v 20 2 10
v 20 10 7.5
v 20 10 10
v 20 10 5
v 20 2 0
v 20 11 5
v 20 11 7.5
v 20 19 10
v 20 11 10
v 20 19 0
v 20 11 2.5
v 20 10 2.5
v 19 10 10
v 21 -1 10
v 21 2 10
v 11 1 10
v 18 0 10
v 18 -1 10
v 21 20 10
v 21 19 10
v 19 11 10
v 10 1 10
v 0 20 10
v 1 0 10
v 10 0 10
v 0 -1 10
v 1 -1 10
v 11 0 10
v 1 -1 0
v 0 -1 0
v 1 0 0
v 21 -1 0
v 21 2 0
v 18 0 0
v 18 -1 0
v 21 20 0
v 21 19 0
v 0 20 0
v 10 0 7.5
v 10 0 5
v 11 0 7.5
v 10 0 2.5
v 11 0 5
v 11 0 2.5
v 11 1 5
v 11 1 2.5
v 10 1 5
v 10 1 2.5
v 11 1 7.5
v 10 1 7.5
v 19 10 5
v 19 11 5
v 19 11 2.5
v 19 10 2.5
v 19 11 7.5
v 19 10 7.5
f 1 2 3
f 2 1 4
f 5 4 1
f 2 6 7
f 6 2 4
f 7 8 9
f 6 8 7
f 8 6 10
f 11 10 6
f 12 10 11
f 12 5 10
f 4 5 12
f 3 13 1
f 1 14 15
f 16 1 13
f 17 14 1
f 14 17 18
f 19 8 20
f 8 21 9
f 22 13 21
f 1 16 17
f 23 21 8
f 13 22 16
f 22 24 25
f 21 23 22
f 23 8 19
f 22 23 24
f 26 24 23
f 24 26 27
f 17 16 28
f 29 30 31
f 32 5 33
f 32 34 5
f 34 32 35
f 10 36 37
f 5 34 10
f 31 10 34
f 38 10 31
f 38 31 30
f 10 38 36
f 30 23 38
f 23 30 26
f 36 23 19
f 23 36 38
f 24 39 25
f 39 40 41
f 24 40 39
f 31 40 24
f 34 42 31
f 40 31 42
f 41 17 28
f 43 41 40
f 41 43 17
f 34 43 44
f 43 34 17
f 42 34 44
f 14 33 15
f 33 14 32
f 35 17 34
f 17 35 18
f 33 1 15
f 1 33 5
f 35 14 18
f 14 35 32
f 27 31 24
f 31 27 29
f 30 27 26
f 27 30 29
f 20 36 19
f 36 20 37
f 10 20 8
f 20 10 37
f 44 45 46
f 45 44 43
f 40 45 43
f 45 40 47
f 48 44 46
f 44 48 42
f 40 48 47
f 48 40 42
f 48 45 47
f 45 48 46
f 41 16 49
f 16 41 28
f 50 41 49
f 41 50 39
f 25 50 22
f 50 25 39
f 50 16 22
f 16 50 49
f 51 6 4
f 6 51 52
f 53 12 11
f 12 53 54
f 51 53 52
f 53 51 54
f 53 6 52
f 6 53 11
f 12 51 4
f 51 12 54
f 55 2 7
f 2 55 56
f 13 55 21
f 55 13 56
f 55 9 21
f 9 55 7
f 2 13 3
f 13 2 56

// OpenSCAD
//
xx = 20;
zz = 10;

pinz = 2.5;
pinx= 1;


difference() {
    union() {
        cube([xx,xx,zz]);
        translate([xx-2,-1,0]) cube([3,3,zz]);
        translate([0,-1,0]) cube([1,2,zz]);
        translate([xx-1,xx-1,0]) cube([2,1,zz]);
        
    }
    translate([xx/2,0,pinz]) cube([pinx,pinx,pinz]);
    translate([xx/2,0,pinz*3]) cube([pinx,pinx,pinz]);
    
    translate([xx-pinx,xx/2,pinz]) cube([pinx,pinx,pinz]);
    translate([xx-pinx,xx/2,pinz*3]) cube([pinx,pinx,pinz]);
}
